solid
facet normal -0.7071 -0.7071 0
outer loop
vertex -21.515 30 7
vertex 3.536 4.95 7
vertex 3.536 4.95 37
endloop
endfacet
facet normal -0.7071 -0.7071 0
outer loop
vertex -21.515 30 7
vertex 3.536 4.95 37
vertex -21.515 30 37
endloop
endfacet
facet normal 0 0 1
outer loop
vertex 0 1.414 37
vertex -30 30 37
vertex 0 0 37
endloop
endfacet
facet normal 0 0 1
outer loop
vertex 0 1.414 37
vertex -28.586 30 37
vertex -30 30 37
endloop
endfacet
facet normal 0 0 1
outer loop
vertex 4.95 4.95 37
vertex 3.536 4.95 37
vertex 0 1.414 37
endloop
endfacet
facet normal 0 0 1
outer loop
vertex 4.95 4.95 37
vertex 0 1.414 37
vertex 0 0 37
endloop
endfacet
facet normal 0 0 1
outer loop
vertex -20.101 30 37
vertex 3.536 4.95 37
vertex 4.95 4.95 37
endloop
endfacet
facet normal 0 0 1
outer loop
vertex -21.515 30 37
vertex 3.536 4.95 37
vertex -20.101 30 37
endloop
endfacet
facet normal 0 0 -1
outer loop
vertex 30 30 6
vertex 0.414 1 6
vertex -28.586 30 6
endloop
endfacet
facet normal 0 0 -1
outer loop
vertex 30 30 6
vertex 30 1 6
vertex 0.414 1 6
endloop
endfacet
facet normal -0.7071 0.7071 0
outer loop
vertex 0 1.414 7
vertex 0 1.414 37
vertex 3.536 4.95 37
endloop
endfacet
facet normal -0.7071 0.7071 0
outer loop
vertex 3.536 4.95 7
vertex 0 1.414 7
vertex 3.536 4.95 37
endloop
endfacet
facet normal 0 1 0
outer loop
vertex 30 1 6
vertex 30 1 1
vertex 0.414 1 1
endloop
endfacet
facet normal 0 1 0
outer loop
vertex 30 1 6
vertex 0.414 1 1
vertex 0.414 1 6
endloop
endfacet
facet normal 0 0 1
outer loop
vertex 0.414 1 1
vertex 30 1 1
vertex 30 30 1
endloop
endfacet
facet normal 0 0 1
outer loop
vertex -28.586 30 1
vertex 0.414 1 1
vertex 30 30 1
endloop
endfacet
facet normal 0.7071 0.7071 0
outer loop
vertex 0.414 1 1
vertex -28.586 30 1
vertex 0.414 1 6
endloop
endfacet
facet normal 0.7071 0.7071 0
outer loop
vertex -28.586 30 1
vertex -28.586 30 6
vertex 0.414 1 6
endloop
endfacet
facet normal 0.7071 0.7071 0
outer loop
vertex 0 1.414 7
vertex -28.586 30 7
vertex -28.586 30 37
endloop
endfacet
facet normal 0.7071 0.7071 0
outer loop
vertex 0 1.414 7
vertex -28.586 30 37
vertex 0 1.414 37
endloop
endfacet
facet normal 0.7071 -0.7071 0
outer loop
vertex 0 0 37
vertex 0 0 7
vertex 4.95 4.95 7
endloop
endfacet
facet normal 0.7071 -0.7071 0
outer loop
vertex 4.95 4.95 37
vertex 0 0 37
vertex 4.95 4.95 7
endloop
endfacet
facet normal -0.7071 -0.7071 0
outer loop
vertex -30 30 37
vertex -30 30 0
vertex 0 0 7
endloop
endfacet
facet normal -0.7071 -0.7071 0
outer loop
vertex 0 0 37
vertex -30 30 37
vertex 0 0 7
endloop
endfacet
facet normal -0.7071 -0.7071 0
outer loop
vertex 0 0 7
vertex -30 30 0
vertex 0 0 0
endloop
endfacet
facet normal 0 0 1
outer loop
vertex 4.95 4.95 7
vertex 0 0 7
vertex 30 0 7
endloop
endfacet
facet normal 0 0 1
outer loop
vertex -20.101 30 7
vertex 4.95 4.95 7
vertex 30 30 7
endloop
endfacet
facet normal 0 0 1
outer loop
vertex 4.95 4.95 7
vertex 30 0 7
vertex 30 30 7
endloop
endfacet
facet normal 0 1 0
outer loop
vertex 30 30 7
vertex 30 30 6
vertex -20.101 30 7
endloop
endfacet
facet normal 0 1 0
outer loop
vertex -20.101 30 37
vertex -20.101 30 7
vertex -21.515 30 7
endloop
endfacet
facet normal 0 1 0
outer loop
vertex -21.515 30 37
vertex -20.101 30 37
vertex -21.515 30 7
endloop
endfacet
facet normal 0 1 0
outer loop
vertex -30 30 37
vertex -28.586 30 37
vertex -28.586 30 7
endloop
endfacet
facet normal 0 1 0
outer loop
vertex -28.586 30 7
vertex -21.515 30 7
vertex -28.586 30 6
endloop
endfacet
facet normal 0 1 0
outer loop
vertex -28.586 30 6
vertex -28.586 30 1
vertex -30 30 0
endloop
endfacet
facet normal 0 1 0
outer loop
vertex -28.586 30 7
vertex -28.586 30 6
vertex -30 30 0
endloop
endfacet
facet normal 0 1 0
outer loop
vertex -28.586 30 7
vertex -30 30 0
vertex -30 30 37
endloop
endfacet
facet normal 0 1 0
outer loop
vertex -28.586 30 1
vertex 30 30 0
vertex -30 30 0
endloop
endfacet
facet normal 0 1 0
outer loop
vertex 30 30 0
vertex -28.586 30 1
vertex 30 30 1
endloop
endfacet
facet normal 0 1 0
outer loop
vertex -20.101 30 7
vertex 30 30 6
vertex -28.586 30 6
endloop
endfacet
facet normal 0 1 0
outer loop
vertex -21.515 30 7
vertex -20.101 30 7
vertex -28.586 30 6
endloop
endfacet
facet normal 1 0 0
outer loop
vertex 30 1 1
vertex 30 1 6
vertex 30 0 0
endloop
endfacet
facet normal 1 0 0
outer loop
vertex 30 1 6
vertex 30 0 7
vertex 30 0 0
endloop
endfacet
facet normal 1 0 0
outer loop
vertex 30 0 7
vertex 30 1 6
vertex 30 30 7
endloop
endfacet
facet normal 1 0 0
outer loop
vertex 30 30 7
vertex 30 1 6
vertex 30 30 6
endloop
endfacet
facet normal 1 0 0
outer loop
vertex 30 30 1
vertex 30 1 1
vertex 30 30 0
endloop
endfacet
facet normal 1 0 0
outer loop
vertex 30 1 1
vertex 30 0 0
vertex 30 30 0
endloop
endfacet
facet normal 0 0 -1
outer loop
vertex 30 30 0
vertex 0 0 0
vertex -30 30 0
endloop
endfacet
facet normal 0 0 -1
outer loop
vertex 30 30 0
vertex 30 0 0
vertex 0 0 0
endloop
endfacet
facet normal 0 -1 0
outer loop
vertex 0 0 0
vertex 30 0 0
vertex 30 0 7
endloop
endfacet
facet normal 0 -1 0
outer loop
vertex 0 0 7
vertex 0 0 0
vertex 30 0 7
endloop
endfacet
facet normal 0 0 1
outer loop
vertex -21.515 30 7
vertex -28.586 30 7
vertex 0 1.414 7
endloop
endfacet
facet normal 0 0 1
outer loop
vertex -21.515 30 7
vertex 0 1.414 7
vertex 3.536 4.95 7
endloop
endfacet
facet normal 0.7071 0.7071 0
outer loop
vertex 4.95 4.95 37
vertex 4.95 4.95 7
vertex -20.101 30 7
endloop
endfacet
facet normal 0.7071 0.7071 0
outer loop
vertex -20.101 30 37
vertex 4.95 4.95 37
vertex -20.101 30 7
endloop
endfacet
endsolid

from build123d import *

# Parameters (mm, degrees)
SKETCH1_W           = 30
SKETCH1_H           = 30
BOSS_EXTRUDE1_DEPTH = 7
SKETCH2_W           = 7
SKETCH2_H           = 30
BOSS_EXTRUDE2_DEPTH = 30
CUT_EXTRUDE1_DEPTH  = 30
SHELL1_T            = -1
BOSS_EXTRUDE3_DEPTH = 30
SHELL2_START        = 7
SHELL2_DEPTH        = 30


# Read off the part's stored shape, not the designer's step: Shell2
with BuildPart() as part:
    # Sketch1 → Boss-Extrude1 (new body)
    with BuildSketch(Plane.XY):
        with Locations((15, 15)):
            Rectangle(SKETCH1_W, SKETCH1_H)
    extrude(amount=BOSS_EXTRUDE1_DEPTH)

    # Sketch2 → Boss-Extrude2 (add)
    with BuildSketch(Plane.ZY):
        with Locations((3.5, 15)):
            Rectangle(SKETCH2_W, SKETCH2_H)
    extrude(amount=BOSS_EXTRUDE2_DEPTH)

    # Sketch3 → Cut-Extrude1 (cut)
    with BuildSketch(Plane.XY.offset(7)):
        Polygon((-30, 30), (0, 0), (-30, 0), align=None)
    extrude(amount=-CUT_EXTRUDE1_DEPTH, mode=Mode.SUBTRACT)

    # Shell1
    shell1_openings = [part.faces().sort_by_distance(p)[0] for p in [
        (0, 30, 3.5),
        (30, 15, 3.5),
    ]]
    offset(amount=SHELL1_T, openings=shell1_openings, kind=Kind.INTERSECTION)

    # Sketch6 → Boss-Extrude3 (add)
    with BuildSketch(Plane.XY.offset(7)):
        Polygon((0, 0), (4.949747468, 4.949747468), (-20.100505063, 30), (-30, 30), align=None)
    extrude(amount=BOSS_EXTRUDE3_DEPTH)

    # Shell2 outline → Shell2 (cut)
    with BuildSketch(Plane.XY.offset(SHELL2_START)):
        Polygon((-28.585786438, 30), (0, 1.414213562), (3.535533906, 4.949747468), (-21.514718626, 30), align=None)
    extrude(amount=SHELL2_DEPTH, mode=Mode.SUBTRACT)


solid = part.part
